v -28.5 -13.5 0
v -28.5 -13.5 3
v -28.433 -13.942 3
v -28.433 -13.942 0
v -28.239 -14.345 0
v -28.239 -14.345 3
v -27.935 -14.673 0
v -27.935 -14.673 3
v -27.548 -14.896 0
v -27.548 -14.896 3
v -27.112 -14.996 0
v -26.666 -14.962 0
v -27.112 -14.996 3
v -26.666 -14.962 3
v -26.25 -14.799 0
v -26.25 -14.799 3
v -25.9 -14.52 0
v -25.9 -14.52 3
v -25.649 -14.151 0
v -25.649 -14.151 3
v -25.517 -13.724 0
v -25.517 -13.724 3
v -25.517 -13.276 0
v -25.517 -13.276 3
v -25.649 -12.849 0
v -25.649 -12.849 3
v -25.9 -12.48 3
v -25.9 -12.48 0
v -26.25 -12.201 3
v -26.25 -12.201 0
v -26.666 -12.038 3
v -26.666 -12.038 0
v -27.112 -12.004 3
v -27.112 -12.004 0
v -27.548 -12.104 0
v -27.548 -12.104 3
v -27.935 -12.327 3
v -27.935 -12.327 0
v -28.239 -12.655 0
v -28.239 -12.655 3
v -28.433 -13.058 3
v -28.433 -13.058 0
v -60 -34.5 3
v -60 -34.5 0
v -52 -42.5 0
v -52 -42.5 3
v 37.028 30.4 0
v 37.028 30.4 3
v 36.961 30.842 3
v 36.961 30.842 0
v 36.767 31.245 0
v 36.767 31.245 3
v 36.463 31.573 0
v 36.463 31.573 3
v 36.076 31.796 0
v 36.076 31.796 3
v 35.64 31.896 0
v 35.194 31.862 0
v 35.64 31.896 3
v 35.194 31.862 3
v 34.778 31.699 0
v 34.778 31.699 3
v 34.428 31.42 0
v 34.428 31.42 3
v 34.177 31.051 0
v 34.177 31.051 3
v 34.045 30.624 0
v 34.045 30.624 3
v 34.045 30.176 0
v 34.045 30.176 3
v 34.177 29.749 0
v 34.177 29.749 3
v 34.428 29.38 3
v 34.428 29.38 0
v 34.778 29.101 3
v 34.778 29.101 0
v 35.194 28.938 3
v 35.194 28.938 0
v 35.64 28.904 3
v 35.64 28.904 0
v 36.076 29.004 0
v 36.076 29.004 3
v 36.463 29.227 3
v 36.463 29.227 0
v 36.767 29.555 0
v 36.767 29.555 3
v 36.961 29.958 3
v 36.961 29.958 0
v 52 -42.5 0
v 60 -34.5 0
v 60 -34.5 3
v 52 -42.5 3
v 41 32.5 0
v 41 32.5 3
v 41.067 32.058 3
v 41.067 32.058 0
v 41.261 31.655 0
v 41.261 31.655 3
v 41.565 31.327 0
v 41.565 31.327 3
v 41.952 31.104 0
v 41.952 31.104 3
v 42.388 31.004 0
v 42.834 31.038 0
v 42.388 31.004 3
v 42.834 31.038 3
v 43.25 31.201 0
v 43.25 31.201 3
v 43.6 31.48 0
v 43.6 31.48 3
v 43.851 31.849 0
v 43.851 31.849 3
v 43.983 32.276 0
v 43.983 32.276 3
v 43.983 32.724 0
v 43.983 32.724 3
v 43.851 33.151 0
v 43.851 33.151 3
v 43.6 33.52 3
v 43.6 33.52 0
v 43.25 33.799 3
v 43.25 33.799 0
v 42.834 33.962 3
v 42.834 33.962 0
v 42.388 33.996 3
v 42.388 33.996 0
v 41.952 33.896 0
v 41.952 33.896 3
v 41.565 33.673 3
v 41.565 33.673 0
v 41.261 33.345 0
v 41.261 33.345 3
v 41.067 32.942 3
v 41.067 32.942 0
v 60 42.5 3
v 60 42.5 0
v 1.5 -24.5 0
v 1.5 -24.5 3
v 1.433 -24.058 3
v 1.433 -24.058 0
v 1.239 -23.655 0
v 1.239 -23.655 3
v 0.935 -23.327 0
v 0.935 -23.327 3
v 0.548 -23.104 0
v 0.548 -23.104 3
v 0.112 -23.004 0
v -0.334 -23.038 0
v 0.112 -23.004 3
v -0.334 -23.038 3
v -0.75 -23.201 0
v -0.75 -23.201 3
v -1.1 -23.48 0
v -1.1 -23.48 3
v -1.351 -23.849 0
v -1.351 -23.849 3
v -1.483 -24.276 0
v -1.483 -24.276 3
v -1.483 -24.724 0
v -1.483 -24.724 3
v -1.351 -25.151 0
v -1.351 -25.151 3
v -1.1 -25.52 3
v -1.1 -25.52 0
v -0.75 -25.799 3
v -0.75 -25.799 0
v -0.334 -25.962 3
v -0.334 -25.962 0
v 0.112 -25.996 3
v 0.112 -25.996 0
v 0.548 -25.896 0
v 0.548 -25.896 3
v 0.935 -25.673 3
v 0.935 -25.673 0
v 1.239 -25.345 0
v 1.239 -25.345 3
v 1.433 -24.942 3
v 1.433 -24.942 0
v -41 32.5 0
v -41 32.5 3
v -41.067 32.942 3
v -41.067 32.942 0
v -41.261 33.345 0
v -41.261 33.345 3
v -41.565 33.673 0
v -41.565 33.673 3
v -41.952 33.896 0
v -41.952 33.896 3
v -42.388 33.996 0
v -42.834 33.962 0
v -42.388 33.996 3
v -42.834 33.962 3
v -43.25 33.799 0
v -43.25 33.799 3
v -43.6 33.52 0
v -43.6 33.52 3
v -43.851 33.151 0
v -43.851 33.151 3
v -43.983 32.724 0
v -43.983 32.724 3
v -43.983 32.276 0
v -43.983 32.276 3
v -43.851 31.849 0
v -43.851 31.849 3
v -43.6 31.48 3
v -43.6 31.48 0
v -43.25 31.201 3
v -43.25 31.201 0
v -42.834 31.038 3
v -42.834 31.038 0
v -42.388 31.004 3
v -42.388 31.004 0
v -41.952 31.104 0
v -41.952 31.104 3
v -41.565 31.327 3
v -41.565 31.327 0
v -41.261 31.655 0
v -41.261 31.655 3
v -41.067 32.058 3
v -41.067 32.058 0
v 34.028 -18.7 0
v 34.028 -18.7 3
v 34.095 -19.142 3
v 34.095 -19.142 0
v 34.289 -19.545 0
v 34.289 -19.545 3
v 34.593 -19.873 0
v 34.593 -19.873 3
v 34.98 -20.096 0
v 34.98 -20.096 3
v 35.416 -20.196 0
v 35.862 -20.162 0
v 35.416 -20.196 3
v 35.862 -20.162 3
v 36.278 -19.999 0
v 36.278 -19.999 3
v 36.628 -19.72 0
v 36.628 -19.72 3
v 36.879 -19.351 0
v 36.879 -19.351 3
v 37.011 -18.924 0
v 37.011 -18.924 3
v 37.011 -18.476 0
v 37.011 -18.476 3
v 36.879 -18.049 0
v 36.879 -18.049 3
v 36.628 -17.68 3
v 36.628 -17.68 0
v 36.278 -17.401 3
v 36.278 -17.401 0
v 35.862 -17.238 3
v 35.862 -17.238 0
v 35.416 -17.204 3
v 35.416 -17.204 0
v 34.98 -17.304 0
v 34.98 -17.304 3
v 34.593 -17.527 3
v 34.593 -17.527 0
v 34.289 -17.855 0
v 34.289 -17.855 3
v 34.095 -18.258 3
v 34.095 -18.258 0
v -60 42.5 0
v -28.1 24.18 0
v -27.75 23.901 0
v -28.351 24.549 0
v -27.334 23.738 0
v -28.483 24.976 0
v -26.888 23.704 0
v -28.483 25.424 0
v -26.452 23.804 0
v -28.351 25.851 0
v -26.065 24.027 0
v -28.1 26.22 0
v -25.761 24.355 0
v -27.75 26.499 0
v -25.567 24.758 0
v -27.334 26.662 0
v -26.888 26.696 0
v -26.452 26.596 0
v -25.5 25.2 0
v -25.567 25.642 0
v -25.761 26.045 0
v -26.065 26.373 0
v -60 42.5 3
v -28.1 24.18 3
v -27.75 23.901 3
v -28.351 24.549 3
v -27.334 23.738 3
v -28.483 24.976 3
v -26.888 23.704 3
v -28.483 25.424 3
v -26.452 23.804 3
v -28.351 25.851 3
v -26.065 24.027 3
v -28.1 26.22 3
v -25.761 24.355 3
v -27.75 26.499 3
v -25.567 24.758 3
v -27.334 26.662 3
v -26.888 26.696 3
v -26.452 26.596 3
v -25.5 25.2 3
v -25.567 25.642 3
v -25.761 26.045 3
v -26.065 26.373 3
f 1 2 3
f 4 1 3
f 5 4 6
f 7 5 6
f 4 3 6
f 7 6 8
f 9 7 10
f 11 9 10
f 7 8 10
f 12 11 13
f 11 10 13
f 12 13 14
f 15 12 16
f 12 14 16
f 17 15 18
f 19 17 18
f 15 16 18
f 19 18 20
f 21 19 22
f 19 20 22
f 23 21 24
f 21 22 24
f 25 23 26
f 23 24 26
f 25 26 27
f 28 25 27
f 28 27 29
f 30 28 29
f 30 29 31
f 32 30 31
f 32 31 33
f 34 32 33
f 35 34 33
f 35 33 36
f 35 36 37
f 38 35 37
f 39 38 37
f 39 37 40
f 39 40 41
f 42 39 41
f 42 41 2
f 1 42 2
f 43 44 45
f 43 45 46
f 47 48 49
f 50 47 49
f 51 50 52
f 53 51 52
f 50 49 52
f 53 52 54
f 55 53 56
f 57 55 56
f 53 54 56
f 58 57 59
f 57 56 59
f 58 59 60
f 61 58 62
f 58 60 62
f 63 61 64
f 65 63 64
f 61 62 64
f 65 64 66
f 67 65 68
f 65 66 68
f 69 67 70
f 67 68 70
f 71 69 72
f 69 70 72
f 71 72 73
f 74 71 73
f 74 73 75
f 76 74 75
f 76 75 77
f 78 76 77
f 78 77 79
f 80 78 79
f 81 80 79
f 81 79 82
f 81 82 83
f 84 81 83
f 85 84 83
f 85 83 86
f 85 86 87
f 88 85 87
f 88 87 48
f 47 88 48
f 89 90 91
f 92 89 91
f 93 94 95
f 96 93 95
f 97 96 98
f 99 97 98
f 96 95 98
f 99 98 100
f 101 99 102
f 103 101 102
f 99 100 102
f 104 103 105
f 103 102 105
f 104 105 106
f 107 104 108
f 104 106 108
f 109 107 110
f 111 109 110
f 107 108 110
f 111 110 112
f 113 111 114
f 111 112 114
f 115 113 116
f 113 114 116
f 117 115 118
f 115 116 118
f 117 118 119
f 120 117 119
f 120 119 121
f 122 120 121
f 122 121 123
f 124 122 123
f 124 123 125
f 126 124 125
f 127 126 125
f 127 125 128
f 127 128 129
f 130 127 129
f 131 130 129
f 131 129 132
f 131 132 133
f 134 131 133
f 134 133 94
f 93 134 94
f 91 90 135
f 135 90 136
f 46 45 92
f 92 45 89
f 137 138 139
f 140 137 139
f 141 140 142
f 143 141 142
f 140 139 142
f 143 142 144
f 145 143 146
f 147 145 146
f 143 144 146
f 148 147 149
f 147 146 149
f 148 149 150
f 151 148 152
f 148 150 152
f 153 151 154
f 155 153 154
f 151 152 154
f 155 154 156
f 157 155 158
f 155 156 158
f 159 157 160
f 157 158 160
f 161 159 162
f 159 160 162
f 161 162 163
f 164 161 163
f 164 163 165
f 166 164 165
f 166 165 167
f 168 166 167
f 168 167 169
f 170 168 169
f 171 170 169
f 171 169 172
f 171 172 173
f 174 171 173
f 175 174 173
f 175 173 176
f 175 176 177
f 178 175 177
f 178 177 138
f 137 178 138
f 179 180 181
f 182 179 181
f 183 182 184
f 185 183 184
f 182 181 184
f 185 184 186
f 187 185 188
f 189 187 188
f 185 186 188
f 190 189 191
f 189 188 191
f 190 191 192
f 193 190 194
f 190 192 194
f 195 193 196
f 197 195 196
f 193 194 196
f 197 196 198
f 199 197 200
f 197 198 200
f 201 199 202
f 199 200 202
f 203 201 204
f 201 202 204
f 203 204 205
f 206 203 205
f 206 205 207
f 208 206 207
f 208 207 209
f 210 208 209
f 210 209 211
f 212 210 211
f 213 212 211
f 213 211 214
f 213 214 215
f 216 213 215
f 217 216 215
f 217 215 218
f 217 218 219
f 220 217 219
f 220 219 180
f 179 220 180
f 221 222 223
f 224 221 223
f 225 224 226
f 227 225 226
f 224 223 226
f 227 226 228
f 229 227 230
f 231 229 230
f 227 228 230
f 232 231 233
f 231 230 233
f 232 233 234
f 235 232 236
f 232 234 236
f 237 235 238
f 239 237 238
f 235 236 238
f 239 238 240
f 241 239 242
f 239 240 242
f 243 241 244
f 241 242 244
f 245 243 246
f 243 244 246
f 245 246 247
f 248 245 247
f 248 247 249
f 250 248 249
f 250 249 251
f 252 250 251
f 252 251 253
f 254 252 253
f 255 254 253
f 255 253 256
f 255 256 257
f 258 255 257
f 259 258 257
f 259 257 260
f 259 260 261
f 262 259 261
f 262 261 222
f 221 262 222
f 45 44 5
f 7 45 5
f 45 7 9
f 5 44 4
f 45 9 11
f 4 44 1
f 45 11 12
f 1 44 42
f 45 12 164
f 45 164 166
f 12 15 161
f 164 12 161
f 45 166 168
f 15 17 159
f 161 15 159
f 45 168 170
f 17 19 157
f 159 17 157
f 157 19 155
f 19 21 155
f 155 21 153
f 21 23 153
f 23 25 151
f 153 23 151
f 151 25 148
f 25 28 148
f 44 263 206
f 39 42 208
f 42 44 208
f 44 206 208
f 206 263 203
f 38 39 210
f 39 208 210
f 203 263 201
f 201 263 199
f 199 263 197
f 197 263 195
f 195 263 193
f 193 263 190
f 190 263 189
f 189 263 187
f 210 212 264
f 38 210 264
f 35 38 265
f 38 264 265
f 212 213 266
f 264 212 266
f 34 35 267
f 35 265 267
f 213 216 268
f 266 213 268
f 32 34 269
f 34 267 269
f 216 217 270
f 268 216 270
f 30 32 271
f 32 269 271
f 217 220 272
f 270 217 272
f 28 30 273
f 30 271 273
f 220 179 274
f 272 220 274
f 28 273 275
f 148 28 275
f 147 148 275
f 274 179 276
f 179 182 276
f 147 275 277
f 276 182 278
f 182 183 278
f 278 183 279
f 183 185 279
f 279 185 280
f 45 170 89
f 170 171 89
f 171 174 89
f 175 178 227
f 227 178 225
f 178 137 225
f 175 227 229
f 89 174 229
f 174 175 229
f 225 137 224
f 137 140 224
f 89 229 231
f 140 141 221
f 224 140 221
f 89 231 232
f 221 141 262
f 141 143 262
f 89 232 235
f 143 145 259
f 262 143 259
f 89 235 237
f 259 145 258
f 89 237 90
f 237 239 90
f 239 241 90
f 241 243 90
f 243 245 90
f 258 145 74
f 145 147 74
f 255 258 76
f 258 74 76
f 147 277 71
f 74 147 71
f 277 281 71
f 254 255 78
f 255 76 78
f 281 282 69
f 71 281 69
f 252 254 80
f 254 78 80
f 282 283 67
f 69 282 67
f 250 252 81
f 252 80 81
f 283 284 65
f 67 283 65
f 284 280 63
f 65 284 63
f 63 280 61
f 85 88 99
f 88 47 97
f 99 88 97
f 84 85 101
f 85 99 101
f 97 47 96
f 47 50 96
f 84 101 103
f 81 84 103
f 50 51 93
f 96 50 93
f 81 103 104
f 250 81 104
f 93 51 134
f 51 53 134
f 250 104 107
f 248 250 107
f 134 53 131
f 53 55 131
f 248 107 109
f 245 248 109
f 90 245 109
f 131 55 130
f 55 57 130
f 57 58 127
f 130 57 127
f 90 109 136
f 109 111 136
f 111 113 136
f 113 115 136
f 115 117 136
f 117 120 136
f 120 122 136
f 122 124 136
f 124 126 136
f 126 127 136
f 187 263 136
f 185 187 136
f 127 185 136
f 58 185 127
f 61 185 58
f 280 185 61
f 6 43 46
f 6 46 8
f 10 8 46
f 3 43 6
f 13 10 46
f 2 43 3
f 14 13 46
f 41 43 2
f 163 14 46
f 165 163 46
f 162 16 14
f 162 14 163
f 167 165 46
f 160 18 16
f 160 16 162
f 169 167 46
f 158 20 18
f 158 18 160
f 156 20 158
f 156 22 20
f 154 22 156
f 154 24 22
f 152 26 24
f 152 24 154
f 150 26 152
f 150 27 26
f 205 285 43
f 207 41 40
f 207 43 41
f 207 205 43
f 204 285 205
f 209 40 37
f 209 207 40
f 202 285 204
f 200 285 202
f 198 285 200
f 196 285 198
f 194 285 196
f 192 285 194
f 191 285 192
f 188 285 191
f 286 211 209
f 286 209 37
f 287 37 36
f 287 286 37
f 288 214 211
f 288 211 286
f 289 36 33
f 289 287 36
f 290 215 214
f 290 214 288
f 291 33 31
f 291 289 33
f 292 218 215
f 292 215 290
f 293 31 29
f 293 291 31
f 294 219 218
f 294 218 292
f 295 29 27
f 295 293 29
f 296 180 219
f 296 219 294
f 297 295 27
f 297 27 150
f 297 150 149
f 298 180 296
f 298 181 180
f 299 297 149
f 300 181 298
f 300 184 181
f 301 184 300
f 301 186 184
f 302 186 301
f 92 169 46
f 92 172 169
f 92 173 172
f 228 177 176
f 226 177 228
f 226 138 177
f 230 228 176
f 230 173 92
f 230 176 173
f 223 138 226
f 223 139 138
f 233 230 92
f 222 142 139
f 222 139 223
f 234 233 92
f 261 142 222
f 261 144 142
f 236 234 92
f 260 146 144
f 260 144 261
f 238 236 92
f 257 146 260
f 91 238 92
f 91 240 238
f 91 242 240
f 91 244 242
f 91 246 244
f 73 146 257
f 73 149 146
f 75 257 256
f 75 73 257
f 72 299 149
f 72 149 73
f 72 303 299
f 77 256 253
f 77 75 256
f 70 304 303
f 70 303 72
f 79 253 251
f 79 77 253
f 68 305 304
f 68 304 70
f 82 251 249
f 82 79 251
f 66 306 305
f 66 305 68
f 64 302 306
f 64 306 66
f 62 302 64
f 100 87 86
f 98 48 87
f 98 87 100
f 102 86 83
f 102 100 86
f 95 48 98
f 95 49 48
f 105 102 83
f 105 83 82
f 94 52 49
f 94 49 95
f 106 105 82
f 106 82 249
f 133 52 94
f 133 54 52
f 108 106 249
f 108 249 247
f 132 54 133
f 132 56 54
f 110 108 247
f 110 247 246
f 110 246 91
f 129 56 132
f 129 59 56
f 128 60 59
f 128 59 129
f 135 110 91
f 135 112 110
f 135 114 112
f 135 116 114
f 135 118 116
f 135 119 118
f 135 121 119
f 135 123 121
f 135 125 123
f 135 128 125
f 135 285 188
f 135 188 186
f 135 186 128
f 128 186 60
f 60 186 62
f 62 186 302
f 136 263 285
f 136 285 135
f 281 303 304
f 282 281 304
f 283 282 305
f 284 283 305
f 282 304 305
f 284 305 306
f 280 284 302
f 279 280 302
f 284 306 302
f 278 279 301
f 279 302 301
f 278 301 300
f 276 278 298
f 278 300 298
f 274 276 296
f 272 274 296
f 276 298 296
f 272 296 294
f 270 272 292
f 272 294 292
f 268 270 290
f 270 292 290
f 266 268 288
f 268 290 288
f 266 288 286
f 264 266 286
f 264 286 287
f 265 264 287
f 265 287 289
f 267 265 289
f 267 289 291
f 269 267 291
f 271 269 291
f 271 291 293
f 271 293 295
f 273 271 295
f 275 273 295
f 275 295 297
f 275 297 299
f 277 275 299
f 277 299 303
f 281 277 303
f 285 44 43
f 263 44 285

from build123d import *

# Parameters (mm, degrees)
SKETCH_1_W          = 120
SKETCH_1_H          = 85
EXTRUDE_1_DEPTH     = 3
SKETCH_2_R          = 1.5
CUT_EXTRUDE_1_DEPTH = 74.588382235
SKETCH_3_R          = 1.5
CUT_EXTRUDE_2_DEPTH = 74.588382235
CHAMFER_1_SIZE      = 8


with BuildPart() as part:
    # 草图1 → 凸台-拉伸1 (new body)
    with BuildSketch(Plane.XY):
        Rectangle(SKETCH_1_W, SKETCH_1_H)
    extrude(amount=EXTRUDE_1_DEPTH)

    # 草图2 → 切除-拉伸1 (cut, through all)
    with BuildSketch(Plane.XY.offset(3)):
        with Locations((0, -24.5)):
            Circle(SKETCH_2_R)
        with Locations((-42.5, 32.5)):
            Circle(SKETCH_2_R)
        with Locations(Location((42.5, 32.5, 0), (0, 0, 180))):
            Circle(SKETCH_2_R)
    extrude(amount=-CUT_EXTRUDE_1_DEPTH, mode=Mode.SUBTRACT)

    # 草图3 → 切除-拉伸2 (cut, through all)
    with BuildSketch(Plane.XY.offset(3)):
        with Locations((35.527993731, 30.4)):
            Circle(SKETCH_3_R)
        with Locations((-27, 25.2)):
            Circle(SKETCH_3_R)
        with Locations(Location((35.527993731, -18.7, 0), (0, 0, 180))):
            Circle(SKETCH_3_R)
        with Locations(Location((-27, -13.5, 0), (0, 0, 180))):
            Circle(SKETCH_3_R)
    extrude(amount=-CUT_EXTRUDE_2_DEPTH, mode=Mode.SUBTRACT)

    # 倒角1
    chamfer_1_edges = [part.edges().sort_by_distance(p)[0] for p in [
        (60, -42.5, 1.5),
        (-60, -42.5, 1.5),
    ]]
    chamfer(chamfer_1_edges, length=CHAMFER_1_SIZE)


solid = part.part
